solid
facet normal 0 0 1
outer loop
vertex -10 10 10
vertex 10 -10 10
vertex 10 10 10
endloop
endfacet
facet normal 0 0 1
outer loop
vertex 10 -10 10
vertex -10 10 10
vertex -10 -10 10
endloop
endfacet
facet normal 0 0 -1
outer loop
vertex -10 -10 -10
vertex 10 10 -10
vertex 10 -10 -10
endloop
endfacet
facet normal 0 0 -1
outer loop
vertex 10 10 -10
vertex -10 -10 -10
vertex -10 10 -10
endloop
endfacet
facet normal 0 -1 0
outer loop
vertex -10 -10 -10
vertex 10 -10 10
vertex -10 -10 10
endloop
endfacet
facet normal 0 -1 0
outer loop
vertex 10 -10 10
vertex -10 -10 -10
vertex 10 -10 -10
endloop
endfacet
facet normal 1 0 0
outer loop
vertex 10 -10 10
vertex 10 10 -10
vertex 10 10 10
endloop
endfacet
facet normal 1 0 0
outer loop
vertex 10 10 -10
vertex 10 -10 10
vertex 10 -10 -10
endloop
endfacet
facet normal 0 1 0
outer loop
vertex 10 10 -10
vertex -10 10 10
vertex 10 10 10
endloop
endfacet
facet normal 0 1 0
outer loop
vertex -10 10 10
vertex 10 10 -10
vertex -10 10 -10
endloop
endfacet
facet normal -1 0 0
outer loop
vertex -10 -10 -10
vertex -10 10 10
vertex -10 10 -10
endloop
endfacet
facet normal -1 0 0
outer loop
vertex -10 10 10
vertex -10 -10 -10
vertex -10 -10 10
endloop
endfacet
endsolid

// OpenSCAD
// Cube Starter
size = 20;
cube([size, size, size], center = true);
